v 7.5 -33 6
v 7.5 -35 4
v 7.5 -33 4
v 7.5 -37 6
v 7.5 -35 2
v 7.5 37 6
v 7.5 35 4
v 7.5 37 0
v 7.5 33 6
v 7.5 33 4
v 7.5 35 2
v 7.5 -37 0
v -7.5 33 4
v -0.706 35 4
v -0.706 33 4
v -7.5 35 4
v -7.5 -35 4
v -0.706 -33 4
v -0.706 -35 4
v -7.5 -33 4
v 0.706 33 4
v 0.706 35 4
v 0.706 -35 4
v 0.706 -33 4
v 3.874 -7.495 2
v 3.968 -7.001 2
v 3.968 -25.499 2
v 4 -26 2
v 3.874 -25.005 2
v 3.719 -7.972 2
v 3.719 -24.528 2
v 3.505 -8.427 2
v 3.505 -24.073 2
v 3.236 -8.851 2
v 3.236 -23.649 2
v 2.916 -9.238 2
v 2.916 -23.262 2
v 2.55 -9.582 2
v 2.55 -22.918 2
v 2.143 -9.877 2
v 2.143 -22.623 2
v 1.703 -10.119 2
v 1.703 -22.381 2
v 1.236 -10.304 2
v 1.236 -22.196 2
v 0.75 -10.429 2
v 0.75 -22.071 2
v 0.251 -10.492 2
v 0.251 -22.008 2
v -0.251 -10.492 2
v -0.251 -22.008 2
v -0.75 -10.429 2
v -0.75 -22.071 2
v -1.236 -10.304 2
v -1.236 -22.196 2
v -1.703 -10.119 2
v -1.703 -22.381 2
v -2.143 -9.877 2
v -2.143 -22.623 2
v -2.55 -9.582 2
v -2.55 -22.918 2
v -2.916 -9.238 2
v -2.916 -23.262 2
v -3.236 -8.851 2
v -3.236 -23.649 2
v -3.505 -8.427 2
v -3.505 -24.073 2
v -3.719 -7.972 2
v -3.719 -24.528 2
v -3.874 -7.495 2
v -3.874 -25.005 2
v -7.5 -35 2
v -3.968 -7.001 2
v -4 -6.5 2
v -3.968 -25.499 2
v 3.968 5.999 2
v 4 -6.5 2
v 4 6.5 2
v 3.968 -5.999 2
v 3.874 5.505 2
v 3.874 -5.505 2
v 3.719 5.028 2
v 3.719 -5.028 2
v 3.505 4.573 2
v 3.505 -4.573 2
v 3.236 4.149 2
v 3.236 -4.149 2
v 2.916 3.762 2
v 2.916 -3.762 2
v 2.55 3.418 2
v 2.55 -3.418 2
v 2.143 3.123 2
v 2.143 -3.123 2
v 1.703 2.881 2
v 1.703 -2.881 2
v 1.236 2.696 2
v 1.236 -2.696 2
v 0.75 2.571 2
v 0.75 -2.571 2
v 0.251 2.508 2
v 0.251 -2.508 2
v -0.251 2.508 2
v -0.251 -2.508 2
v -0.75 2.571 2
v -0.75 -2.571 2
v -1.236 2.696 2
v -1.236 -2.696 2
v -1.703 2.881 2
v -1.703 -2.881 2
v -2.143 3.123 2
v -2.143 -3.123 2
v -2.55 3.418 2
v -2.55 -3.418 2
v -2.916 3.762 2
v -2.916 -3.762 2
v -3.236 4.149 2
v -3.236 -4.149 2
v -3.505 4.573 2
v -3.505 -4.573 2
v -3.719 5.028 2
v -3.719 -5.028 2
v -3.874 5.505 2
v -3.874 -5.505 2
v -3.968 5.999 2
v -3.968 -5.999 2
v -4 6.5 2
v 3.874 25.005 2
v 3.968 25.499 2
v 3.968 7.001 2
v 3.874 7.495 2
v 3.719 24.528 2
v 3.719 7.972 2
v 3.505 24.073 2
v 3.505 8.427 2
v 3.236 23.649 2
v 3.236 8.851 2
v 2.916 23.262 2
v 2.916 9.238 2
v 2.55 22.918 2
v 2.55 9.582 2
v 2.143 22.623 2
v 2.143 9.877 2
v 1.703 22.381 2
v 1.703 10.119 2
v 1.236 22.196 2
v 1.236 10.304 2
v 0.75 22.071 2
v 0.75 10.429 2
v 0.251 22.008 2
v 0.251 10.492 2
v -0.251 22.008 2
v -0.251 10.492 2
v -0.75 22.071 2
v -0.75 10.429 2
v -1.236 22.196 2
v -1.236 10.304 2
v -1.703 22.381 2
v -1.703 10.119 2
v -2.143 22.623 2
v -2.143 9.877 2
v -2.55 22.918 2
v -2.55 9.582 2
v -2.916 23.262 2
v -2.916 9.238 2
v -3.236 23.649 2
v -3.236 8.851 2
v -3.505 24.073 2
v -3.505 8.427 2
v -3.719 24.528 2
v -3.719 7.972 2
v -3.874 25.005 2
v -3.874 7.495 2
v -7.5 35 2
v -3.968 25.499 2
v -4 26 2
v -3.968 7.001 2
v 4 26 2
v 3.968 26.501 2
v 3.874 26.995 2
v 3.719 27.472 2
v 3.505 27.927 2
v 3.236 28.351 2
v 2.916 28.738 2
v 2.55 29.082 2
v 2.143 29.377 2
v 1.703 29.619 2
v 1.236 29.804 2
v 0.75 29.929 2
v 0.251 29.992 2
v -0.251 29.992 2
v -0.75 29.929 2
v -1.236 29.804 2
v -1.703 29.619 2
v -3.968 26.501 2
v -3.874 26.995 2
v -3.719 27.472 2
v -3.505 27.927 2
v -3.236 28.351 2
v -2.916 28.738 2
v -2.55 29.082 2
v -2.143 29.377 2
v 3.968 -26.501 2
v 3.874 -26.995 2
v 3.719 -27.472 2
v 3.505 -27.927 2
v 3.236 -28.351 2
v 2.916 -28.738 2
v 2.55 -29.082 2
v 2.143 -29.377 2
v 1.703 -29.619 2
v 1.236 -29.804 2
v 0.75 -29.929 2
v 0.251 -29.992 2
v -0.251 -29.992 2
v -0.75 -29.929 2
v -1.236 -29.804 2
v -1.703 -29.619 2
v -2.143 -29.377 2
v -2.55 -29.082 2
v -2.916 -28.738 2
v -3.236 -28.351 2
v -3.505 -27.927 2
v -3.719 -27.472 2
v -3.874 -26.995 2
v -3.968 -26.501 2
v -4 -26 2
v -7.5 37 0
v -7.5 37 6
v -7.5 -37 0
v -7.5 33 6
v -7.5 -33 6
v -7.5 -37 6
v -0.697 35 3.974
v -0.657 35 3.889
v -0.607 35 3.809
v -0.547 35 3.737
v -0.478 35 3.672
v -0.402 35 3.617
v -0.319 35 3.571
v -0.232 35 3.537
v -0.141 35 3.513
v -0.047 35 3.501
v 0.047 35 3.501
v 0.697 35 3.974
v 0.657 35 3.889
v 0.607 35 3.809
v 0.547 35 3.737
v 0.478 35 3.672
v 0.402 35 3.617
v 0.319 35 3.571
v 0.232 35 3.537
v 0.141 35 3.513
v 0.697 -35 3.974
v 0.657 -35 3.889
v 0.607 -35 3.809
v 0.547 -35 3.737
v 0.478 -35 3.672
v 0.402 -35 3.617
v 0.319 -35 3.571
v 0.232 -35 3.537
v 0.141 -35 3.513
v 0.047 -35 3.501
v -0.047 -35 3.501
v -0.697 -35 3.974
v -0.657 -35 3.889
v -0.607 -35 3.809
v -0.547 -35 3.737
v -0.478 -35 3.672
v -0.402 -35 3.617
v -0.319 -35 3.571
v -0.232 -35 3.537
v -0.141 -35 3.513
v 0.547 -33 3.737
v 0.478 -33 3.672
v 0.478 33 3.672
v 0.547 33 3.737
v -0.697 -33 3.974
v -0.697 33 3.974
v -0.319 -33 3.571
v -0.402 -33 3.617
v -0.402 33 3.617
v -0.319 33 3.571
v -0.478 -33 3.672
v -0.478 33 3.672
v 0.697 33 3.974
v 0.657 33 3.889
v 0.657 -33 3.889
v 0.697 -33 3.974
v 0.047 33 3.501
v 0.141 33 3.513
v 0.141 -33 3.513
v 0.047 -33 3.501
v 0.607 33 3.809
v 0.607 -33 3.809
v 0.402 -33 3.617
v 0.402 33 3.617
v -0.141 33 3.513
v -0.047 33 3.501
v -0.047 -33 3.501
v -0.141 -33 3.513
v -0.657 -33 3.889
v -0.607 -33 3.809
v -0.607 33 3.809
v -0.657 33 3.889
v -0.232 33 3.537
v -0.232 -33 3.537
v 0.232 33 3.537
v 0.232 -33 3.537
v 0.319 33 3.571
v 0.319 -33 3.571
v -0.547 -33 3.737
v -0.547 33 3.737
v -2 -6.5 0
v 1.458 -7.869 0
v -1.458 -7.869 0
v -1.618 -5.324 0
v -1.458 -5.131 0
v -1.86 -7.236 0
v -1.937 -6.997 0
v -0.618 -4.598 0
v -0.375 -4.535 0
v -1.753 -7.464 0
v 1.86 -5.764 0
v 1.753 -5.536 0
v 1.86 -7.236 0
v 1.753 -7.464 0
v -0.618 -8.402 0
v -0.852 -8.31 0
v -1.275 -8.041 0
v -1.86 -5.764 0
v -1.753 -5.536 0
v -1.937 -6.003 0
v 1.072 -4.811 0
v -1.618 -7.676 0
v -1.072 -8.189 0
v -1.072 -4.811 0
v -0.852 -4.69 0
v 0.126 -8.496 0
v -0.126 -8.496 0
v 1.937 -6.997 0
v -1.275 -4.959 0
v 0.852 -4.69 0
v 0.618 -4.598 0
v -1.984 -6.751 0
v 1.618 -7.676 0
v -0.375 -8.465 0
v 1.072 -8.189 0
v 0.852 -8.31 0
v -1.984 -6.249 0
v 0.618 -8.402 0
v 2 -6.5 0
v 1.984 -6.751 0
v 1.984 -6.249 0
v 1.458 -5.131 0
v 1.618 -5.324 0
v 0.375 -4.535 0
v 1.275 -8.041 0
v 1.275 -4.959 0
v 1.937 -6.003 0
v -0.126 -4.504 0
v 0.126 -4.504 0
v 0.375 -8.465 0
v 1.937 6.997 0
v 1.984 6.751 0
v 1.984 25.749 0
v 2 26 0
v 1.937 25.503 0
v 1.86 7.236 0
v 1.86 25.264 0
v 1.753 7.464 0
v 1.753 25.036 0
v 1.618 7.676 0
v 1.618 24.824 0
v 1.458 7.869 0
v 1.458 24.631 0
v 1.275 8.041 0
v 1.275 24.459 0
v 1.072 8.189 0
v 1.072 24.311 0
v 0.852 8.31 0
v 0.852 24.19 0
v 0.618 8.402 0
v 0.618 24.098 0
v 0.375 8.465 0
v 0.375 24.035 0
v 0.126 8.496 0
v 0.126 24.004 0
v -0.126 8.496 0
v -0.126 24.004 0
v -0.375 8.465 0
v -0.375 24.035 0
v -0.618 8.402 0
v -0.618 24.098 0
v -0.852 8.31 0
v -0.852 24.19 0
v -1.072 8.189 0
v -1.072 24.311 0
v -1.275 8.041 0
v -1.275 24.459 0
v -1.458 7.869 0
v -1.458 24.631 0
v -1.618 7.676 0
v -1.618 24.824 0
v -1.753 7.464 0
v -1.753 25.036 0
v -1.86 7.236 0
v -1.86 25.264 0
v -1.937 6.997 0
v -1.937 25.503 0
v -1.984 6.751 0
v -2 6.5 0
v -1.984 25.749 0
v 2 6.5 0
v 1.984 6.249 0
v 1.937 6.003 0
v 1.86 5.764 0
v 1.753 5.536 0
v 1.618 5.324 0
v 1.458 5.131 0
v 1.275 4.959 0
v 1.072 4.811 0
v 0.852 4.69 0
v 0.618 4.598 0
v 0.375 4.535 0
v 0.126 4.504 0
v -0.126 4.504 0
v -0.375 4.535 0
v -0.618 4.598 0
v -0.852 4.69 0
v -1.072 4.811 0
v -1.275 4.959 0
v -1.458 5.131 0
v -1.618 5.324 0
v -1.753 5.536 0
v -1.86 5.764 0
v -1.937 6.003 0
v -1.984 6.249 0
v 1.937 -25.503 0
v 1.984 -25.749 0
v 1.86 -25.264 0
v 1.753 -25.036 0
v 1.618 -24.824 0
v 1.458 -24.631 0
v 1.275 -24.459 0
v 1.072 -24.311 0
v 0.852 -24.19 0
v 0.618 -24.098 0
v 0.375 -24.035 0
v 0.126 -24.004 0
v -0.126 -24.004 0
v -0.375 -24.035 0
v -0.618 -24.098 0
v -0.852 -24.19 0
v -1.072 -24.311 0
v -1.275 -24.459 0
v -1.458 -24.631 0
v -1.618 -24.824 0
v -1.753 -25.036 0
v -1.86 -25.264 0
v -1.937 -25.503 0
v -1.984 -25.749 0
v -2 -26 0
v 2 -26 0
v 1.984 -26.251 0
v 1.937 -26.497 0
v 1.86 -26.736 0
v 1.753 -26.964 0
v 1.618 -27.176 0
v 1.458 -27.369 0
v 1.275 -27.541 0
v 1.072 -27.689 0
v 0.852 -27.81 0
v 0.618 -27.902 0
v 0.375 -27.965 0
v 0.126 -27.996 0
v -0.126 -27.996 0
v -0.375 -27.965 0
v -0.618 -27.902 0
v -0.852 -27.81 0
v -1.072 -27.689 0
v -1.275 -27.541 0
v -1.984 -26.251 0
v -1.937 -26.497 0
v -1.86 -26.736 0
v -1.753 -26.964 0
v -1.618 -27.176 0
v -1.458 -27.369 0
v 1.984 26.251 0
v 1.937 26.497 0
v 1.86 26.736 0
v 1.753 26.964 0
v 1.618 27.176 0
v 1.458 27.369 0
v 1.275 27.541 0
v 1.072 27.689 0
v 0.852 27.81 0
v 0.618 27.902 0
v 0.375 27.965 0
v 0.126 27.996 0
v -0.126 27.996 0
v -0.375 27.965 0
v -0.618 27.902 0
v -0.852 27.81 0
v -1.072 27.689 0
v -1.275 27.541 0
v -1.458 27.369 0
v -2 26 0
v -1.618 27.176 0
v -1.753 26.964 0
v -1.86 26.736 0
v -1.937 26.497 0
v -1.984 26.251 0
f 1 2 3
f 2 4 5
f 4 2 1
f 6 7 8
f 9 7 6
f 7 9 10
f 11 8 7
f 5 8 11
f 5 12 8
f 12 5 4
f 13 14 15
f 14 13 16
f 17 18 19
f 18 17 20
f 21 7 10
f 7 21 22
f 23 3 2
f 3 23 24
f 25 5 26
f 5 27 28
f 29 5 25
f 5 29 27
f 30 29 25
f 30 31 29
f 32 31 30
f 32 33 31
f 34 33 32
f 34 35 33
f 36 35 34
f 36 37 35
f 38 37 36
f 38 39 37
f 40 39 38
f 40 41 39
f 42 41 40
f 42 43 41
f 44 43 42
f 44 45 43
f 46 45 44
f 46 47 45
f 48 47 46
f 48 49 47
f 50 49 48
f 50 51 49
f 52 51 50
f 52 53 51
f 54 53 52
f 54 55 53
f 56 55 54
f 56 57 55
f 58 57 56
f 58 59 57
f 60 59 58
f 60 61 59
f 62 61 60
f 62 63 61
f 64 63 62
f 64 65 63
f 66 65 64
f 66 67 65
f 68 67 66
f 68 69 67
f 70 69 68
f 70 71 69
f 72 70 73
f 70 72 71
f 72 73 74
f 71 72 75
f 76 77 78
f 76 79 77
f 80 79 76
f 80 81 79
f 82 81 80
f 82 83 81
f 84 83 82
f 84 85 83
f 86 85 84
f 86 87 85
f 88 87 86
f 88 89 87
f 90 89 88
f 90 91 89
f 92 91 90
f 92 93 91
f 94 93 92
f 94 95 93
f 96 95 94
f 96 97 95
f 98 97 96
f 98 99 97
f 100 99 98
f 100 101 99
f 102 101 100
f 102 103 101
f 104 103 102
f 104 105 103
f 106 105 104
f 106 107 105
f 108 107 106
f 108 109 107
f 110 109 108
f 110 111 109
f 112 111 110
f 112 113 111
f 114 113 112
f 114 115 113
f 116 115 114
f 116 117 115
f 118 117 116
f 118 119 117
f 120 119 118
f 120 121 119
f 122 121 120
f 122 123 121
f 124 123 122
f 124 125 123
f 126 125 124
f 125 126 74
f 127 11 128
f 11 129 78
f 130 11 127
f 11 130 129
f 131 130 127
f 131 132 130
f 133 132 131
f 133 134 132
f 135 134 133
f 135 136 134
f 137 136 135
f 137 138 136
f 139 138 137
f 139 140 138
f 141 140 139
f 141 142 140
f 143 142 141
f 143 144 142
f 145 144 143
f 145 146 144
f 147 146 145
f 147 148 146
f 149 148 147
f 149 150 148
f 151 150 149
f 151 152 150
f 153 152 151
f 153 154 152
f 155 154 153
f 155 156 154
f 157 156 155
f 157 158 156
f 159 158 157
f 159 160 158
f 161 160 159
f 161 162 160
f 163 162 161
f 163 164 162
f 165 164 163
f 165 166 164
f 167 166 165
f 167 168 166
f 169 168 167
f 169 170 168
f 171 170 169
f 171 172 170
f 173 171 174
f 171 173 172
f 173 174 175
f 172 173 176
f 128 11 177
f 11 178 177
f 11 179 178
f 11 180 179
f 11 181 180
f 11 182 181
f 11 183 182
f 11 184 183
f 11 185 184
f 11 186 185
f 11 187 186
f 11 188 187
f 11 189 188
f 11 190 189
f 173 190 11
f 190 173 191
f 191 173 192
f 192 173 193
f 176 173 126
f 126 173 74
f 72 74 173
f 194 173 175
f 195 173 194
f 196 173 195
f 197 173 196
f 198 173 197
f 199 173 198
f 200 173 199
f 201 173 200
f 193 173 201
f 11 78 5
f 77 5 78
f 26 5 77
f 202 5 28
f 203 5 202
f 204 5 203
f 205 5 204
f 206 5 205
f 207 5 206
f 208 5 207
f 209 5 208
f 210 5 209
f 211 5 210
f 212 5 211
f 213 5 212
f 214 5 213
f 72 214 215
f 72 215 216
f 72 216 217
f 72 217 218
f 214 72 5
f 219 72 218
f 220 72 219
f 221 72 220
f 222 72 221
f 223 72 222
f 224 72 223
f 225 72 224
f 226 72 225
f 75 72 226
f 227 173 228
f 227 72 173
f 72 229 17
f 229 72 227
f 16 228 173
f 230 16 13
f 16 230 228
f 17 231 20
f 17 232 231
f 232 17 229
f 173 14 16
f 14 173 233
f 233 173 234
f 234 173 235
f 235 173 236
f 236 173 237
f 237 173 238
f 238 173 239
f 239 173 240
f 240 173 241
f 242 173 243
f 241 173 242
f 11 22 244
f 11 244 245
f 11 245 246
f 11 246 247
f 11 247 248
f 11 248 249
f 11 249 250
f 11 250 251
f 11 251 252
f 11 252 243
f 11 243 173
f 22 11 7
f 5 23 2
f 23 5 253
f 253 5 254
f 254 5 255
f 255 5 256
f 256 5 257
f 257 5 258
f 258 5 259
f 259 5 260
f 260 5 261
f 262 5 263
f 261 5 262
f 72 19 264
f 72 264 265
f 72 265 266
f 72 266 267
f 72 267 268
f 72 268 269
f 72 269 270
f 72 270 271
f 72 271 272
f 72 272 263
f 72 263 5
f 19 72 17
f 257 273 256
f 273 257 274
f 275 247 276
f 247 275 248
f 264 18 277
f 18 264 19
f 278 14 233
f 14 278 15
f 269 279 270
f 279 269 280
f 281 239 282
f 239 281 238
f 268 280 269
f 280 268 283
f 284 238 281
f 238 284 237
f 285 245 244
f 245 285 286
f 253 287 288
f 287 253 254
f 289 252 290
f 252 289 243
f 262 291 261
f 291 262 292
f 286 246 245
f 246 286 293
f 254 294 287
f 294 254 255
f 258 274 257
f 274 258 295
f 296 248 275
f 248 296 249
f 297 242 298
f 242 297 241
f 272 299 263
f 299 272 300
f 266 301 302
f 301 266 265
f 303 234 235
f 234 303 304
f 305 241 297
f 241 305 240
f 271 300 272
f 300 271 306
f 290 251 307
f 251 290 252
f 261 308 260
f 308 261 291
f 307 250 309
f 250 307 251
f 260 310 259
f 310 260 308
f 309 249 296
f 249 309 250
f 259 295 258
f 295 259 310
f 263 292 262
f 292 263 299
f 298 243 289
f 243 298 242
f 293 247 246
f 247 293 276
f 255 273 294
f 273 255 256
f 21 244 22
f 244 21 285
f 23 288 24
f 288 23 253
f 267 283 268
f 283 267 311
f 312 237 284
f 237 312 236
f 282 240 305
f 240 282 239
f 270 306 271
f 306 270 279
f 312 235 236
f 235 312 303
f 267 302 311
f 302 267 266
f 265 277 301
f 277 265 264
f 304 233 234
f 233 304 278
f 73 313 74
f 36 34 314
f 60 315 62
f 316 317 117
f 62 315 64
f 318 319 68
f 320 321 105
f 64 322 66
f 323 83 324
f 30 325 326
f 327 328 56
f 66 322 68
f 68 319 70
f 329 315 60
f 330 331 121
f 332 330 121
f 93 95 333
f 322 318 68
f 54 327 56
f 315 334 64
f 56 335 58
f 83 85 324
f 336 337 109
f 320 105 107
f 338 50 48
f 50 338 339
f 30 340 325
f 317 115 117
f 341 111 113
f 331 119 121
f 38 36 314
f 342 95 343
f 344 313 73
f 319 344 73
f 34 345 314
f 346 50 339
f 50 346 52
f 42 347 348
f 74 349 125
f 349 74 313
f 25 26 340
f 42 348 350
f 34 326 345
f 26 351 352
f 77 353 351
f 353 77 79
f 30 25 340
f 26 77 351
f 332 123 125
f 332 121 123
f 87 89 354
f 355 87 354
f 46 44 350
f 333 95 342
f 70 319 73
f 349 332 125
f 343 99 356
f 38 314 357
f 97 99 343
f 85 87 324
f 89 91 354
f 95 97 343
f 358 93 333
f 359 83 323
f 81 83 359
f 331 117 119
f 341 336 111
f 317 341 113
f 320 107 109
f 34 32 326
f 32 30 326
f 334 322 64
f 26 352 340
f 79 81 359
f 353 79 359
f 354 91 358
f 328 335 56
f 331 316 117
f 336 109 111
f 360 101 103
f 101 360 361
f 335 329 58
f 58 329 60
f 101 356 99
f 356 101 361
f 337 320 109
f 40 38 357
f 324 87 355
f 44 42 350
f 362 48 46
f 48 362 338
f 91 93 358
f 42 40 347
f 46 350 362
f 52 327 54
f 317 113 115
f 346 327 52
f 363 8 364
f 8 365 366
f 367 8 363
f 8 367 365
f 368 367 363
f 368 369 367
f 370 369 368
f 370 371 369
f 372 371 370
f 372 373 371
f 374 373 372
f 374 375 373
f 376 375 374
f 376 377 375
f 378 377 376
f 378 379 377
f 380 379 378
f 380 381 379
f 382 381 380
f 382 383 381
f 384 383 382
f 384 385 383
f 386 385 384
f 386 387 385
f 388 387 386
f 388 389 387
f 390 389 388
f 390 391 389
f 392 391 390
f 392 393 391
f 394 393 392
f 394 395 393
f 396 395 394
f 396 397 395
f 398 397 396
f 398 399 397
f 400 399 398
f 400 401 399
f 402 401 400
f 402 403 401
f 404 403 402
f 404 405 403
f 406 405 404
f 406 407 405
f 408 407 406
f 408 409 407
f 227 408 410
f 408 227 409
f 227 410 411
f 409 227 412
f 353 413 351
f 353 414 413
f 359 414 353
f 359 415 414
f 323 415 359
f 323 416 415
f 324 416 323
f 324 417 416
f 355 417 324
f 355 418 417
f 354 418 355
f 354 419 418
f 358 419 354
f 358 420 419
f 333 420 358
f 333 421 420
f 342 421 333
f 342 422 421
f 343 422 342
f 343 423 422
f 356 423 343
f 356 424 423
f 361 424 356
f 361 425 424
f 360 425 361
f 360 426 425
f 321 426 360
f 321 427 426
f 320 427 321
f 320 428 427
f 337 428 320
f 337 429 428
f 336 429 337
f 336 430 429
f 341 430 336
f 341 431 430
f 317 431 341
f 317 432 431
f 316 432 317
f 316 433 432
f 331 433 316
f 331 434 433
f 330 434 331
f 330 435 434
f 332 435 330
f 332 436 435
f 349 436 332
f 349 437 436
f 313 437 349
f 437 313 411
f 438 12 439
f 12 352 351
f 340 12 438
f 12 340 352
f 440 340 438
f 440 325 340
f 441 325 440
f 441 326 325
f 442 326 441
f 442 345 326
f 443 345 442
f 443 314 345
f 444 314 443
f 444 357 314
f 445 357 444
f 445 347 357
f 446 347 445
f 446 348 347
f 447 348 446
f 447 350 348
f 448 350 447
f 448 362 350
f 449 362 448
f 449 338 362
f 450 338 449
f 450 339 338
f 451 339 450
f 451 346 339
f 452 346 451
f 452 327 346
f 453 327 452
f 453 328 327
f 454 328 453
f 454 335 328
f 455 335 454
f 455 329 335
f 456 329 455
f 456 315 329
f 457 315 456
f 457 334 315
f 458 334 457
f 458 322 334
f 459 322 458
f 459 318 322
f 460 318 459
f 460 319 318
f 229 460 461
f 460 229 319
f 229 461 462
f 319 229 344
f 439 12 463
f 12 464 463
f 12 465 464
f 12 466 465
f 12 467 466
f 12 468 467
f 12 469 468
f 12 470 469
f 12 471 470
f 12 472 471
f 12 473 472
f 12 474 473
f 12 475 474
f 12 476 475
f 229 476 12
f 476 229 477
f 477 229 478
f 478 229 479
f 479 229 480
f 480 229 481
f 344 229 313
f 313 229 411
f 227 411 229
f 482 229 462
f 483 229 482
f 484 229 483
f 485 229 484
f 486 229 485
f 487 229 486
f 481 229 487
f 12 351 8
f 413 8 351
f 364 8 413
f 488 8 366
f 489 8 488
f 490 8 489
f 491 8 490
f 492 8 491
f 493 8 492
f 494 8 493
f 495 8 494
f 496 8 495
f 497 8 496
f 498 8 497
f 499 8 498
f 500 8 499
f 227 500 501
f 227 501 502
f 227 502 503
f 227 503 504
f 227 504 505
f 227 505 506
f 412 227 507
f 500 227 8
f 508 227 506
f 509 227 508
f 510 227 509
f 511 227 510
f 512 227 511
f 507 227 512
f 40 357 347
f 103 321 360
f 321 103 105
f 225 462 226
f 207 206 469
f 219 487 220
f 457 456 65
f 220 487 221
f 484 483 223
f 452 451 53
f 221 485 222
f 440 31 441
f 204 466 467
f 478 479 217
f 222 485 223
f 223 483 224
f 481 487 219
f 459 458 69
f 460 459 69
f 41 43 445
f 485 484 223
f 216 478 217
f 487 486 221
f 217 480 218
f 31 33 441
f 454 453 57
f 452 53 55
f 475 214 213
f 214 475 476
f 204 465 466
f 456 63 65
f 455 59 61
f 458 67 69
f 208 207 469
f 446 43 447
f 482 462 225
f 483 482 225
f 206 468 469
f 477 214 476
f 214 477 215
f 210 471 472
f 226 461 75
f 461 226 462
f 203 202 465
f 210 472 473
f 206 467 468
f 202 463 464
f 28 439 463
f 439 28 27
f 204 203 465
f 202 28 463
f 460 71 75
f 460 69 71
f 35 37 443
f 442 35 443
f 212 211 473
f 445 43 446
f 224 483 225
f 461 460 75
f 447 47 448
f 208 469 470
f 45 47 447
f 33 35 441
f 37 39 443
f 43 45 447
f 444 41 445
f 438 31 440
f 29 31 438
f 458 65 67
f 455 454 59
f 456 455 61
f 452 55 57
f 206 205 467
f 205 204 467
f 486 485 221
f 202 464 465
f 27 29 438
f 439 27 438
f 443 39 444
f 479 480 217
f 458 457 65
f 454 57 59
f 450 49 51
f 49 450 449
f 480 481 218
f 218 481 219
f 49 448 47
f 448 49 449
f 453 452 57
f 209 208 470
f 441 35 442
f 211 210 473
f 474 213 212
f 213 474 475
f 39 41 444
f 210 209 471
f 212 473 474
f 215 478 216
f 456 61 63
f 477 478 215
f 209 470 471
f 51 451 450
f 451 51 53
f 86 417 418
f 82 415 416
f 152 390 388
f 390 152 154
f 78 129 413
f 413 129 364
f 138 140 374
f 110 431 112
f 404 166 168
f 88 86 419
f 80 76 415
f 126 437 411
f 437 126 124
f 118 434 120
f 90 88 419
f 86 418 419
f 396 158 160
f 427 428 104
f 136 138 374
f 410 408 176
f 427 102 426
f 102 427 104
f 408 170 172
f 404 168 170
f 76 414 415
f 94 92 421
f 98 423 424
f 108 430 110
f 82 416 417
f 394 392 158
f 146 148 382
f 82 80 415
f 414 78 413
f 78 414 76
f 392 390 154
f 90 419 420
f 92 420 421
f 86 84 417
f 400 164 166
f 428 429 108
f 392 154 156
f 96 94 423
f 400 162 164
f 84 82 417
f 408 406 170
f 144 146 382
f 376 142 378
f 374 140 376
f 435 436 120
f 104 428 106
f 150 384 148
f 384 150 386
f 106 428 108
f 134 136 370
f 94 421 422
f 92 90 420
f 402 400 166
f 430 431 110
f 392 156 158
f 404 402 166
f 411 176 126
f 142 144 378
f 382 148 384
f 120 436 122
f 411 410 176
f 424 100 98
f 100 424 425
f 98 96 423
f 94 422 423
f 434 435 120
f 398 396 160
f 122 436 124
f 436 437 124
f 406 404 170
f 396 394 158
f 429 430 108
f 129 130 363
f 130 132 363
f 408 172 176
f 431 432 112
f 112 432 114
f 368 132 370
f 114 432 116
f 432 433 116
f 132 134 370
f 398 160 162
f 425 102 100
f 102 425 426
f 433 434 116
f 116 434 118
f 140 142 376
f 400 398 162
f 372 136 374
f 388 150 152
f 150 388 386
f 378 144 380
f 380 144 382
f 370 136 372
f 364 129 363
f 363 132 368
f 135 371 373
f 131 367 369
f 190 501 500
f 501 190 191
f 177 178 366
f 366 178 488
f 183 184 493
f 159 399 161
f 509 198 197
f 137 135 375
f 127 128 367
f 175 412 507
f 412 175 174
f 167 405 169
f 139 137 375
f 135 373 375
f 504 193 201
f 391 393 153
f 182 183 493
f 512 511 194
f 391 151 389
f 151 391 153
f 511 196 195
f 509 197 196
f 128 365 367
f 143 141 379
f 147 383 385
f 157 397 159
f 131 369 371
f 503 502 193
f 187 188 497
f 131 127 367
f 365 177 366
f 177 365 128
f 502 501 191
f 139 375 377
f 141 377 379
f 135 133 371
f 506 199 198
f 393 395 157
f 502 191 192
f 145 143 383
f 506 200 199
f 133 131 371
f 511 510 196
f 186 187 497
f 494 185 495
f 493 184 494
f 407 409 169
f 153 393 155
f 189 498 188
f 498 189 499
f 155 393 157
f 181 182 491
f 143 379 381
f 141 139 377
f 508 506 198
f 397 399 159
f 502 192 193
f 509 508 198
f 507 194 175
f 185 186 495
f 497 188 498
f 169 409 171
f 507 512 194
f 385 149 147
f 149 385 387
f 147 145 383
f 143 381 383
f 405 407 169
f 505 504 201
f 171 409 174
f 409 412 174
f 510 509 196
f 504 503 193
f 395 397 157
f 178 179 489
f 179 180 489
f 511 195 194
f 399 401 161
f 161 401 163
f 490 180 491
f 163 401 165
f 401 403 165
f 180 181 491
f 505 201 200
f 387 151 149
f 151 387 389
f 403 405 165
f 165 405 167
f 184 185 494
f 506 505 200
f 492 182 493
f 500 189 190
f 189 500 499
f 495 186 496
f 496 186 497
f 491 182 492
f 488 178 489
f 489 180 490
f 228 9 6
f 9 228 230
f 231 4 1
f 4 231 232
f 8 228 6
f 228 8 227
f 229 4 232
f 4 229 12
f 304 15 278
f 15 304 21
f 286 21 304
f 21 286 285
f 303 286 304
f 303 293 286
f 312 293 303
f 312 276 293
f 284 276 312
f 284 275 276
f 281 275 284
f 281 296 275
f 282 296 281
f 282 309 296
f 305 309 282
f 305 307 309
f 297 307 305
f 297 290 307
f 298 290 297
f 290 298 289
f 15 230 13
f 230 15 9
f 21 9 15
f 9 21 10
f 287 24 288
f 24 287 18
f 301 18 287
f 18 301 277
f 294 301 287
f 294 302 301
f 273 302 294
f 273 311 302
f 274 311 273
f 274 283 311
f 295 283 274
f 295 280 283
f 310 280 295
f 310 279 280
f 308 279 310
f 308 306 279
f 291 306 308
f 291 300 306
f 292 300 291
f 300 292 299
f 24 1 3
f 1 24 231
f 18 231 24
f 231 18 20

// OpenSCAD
WIDTH = 15;
CLAMPED_LENGTH = 70;
BASE_THICKNESS = 2;
CLAMPED_THICKNESS = 2;
THICKNESS = 2*BASE_THICKNESS + CLAMPED_THICKNESS;
LENGTH = CLAMPED_LENGTH + 2*BASE_THICKNESS;
NOTCH_WIDTH = 1.5;
NOTCH_THICKNESS = 0.5;

HOLE_DIA_TOP = 8;
HOLE_DIA_BOT = 4;
HOLE_SPACING_1 = 13;
HOLE_SPACING_2 = 52;

$fn = 50;

difference() {
  translate([-WIDTH/2, -LENGTH/2, 0])
  cube([WIDTH, LENGTH, THICKNESS]);

  #translate([-WIDTH/2, -CLAMPED_LENGTH/2, BASE_THICKNESS])
  difference() {
    cube([WIDTH, CLAMPED_LENGTH, CLAMPED_THICKNESS]);
    #translate([WIDTH/2, 0, CLAMPED_THICKNESS+NOTCH_WIDTH/2-NOTCH_THICKNESS])
    rotate([-90, 0, 0])
    cylinder(d = NOTCH_WIDTH, h = CLAMPED_LENGTH);
  }

  #translate([-WIDTH/2, -CLAMPED_LENGTH/2 + BASE_THICKNESS, BASE_THICKNESS])
  cube([WIDTH, CLAMPED_LENGTH - 2*BASE_THICKNESS, THICKNESS]);

  #for(i = [-1, 1]) {
    translate([0, i*HOLE_SPACING_1/2, 0])
    cylinder(d1 = HOLE_DIA_BOT, d2 = HOLE_DIA_TOP, h = BASE_THICKNESS);
    translate([0, i*HOLE_SPACING_2/2, 0])
    cylinder(d1 = HOLE_DIA_BOT, d2 = HOLE_DIA_TOP, h = BASE_THICKNESS);
  }
}
